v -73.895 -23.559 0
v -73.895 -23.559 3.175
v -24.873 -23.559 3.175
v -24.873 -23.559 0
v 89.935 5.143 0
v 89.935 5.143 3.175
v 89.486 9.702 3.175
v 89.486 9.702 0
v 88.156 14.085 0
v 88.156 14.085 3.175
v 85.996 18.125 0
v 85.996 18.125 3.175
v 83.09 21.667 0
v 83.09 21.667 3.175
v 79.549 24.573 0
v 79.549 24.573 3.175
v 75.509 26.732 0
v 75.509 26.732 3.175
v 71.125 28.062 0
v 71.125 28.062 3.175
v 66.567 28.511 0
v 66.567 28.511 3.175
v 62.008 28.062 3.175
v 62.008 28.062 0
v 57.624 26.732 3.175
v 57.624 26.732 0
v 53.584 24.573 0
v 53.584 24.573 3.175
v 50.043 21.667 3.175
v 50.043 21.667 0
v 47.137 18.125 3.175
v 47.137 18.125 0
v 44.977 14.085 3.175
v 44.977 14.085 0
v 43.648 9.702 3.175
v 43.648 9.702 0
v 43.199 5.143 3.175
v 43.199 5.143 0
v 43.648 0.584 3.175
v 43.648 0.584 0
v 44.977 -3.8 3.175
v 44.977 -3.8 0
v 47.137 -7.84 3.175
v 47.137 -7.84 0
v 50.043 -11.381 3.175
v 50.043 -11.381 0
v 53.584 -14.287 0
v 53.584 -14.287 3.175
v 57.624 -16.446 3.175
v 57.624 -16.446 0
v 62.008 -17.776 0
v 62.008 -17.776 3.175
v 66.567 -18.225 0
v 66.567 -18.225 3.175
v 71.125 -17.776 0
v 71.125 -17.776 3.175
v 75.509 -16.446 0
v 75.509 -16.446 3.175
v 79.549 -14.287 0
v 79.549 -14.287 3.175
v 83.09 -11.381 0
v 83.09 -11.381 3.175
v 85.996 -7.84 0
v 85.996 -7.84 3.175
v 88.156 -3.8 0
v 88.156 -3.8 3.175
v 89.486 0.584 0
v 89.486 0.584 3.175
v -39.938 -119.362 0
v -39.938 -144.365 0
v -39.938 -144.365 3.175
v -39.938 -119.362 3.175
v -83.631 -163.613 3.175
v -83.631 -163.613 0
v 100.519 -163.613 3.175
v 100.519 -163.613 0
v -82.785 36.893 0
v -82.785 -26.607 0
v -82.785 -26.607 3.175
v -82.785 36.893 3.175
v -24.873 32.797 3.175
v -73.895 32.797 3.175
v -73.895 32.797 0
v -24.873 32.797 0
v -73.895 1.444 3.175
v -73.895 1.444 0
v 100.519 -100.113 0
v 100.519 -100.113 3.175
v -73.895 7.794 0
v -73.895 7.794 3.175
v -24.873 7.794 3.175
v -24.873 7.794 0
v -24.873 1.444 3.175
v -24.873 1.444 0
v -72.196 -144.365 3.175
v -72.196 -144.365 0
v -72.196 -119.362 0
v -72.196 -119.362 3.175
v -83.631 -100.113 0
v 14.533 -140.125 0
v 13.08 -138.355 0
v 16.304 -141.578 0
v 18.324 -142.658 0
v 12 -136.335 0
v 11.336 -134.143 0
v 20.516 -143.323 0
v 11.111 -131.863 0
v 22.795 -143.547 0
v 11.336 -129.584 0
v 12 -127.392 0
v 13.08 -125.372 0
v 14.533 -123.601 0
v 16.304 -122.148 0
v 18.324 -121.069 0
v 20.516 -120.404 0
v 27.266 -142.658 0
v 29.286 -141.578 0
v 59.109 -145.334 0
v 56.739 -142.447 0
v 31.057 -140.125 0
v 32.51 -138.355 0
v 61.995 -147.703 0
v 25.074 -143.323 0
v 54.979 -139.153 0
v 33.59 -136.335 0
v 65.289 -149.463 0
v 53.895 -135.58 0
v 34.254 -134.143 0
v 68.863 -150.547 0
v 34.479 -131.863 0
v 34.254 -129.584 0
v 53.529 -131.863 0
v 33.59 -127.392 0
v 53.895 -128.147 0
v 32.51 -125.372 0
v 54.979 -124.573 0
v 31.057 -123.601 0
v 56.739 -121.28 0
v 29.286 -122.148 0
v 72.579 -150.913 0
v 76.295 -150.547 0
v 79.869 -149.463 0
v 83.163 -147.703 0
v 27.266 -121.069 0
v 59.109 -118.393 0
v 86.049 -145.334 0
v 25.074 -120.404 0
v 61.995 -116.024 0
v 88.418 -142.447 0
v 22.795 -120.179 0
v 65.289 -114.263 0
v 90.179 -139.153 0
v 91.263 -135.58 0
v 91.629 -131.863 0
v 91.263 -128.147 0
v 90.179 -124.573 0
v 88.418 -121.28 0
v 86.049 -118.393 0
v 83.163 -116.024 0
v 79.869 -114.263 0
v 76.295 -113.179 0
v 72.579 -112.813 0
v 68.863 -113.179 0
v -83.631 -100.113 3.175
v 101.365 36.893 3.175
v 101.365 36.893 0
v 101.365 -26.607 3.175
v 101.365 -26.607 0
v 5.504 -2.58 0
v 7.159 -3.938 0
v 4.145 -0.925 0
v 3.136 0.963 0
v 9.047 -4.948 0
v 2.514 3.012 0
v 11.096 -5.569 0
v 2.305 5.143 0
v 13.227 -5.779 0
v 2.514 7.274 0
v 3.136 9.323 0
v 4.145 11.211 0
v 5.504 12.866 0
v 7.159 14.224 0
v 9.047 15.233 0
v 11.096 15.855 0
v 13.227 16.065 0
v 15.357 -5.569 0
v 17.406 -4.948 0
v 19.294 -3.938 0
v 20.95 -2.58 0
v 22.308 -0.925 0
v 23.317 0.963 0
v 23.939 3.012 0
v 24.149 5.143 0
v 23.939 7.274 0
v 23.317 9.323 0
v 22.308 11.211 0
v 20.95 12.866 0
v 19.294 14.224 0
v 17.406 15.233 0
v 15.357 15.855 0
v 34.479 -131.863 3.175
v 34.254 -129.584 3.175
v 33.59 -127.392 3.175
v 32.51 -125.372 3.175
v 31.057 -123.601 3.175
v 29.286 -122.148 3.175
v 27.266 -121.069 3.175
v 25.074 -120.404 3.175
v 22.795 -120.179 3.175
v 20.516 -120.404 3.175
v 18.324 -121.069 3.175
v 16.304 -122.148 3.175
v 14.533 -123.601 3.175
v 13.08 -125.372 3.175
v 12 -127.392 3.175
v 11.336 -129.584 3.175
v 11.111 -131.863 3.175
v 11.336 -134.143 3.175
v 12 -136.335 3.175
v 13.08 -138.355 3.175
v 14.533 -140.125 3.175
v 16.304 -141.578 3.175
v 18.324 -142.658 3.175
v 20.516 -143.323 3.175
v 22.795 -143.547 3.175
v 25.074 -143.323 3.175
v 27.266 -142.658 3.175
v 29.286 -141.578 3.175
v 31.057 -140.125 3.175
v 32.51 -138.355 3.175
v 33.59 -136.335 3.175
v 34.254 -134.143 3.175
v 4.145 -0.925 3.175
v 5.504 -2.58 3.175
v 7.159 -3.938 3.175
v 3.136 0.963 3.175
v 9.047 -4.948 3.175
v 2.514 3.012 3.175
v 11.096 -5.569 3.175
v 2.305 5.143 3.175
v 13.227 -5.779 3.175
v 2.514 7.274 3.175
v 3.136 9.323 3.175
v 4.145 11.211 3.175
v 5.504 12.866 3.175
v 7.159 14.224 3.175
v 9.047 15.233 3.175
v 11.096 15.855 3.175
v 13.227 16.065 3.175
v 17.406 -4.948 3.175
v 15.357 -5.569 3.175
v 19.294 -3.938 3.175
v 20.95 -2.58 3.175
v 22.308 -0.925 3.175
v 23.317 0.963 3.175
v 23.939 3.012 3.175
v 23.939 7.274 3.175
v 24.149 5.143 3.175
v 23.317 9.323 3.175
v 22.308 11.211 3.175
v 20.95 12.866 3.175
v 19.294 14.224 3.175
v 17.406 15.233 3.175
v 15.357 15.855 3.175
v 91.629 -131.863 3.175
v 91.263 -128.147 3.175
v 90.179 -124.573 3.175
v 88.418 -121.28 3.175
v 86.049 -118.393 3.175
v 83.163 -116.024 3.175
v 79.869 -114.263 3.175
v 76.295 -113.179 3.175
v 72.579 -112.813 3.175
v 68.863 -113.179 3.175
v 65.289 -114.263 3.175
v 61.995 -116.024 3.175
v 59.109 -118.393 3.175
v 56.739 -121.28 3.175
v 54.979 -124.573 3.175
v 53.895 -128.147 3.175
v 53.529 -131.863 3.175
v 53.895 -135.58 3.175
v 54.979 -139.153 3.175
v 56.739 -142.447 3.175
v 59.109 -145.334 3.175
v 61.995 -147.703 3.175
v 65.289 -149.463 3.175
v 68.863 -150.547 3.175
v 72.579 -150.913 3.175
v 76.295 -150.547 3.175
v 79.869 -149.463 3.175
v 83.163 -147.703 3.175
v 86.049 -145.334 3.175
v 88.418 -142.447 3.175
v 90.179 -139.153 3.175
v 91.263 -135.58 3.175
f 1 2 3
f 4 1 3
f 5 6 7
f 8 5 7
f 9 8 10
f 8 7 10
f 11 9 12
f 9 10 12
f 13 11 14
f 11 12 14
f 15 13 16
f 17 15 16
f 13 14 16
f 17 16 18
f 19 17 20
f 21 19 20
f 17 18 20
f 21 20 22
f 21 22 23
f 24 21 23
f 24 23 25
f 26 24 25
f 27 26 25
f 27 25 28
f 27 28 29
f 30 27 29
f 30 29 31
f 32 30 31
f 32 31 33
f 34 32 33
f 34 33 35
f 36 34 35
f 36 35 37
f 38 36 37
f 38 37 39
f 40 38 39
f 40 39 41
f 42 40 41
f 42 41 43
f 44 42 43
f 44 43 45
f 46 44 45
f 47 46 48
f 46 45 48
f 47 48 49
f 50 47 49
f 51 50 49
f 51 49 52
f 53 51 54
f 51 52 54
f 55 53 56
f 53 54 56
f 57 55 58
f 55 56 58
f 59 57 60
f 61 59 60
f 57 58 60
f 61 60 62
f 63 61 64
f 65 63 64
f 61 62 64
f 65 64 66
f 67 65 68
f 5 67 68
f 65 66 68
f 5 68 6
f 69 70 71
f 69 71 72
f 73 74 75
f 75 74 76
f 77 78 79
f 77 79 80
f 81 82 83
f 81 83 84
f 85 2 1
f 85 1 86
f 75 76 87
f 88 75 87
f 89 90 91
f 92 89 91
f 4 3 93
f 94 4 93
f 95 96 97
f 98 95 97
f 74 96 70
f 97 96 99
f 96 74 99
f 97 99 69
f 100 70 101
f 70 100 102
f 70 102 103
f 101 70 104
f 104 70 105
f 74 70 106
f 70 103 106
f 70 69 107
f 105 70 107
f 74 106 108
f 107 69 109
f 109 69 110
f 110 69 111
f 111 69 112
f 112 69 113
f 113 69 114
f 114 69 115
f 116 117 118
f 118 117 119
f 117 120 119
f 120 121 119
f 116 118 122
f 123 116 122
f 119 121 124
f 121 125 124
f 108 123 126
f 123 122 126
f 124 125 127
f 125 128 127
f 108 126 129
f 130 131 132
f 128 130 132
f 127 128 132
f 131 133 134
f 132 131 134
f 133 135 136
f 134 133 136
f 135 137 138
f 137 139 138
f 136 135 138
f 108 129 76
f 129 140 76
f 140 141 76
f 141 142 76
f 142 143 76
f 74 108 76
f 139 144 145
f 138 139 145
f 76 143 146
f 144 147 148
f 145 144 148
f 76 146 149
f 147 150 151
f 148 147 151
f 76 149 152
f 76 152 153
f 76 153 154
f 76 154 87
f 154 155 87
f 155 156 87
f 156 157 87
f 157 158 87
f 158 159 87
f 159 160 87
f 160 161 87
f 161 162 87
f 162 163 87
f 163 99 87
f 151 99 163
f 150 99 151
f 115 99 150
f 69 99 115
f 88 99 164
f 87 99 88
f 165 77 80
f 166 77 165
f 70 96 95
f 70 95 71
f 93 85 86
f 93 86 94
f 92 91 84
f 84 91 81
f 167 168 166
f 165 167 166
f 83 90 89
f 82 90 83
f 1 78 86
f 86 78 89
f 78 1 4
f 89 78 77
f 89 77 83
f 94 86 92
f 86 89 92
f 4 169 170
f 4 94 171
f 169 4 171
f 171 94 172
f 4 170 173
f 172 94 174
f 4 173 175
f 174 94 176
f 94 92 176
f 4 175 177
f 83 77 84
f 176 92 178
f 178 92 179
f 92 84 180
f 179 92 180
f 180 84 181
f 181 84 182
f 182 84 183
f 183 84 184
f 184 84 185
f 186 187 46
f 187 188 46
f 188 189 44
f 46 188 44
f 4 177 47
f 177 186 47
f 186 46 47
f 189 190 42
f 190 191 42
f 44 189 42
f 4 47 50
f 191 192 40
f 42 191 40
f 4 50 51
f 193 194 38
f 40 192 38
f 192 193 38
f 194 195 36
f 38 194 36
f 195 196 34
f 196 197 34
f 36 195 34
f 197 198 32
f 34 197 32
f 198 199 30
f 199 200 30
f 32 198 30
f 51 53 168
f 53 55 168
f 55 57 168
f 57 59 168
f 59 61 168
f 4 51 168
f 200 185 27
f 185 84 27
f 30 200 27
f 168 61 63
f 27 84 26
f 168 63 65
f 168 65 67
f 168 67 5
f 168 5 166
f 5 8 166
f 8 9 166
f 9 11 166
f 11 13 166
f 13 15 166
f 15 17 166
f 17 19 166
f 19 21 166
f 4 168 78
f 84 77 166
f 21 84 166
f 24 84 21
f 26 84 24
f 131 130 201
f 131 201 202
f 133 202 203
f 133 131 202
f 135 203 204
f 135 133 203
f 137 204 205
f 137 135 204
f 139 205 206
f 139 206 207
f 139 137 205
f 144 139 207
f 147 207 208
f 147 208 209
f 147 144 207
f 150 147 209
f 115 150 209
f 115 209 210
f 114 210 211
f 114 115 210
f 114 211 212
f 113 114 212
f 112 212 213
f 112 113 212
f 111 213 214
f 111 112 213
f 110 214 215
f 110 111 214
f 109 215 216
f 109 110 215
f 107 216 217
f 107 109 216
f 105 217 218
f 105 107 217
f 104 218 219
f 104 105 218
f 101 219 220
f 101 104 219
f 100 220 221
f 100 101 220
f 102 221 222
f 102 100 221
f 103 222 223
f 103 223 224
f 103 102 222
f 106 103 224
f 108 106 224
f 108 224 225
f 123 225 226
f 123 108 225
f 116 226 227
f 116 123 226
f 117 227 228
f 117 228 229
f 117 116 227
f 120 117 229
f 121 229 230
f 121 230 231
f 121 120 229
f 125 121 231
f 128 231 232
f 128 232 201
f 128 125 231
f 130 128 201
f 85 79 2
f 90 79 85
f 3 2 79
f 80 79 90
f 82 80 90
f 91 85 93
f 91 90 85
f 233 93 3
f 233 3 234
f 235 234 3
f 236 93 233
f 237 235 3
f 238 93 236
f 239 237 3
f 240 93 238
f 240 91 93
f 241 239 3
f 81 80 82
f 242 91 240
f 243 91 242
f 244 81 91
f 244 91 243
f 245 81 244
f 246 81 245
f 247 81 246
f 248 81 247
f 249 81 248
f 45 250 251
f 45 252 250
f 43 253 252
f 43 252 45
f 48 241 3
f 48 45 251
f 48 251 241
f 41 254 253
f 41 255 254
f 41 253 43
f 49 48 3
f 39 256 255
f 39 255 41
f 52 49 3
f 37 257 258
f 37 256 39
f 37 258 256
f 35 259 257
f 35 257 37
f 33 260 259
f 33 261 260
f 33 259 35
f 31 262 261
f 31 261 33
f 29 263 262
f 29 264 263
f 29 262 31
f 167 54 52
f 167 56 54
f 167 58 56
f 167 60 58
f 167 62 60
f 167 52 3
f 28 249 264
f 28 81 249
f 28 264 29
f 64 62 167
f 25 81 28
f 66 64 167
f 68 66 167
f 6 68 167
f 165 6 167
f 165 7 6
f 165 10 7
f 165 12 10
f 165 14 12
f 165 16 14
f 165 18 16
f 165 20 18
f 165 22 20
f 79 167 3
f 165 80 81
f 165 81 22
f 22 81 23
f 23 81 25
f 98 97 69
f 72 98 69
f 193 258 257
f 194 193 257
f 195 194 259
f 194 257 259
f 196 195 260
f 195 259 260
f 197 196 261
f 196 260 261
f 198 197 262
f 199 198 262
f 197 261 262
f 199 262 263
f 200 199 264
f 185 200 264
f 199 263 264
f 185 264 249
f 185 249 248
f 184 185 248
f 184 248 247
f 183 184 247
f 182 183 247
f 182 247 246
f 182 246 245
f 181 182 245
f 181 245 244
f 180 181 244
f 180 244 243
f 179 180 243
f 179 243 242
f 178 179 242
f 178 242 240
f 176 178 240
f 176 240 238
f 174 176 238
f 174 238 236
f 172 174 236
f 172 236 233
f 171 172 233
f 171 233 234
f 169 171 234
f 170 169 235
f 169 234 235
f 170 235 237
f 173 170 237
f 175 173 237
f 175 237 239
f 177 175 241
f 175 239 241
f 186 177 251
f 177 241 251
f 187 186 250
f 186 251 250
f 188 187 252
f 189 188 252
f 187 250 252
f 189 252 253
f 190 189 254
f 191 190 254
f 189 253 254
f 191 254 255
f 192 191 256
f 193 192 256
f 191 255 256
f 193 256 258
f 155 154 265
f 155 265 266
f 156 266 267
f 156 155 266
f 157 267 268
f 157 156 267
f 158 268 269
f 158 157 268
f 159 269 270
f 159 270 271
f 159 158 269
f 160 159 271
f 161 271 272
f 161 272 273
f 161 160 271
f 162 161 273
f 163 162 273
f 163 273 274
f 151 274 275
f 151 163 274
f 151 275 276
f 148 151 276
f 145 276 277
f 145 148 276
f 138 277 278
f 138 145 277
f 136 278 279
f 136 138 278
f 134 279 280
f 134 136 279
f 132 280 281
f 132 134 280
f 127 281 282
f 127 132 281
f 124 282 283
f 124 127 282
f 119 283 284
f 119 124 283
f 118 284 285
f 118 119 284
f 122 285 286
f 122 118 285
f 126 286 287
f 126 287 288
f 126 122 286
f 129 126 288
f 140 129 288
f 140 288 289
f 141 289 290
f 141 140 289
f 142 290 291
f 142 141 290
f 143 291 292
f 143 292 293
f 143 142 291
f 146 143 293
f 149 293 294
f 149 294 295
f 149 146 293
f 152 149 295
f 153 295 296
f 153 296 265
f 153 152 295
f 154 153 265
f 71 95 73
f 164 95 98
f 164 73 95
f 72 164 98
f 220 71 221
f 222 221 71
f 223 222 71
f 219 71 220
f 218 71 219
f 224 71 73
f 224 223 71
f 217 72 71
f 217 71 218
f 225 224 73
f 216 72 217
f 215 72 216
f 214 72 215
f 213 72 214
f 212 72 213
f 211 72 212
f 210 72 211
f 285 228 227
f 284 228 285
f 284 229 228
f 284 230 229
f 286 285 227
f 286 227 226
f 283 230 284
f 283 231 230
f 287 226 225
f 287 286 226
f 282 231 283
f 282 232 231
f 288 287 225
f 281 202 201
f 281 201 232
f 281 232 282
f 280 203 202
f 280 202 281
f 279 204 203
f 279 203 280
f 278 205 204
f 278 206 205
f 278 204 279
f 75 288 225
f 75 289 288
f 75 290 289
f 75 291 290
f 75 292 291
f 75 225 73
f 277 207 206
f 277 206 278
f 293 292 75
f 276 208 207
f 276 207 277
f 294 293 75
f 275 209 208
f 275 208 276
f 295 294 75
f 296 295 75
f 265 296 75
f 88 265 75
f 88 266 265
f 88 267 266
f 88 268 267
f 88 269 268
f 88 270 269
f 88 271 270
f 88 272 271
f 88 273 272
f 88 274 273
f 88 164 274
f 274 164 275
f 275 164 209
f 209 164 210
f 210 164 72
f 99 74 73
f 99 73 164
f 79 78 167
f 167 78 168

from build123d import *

# Parameters (mm, degrees)
F0_W     = 184.15
F0_H     = 63.5
F1_DEPTH = 3.175
F2_W     = 49.022
F2_H     = 25.003125
F2_R     = 23.368
F2_R_2   = 10.922
F3_DEPTH = 25.4
F4_W     = 184.15
F4_H     = 63.5
F5_DEPTH = 3.175
F6_R     = 19.05
F6_R_2   = 11.684
F6_W     = 32.258
F6_H     = 25.003125
F7_DEPTH = 3.175


with BuildPart() as f1:
    # F0 (on Top) → F1 (new body)
    with BuildSketch(Plane.XY):
        with Locations((9.289552, 5.142859)):
            Rectangle(F0_W, F0_H)
    extrude(amount=F1_DEPTH)

    # F2 (on face) → F3 (cut)
    with BuildSketch(Plane.XY.offset(3.175)):
        with Locations((-49.384448, 20.295544)):
            Rectangle(F2_W, F2_H)
        with Locations((-49.384448, -11.057581)):
            Rectangle(F2_W, F2_H)
        with Locations((66.566552, 5.142859)):
            Circle(F2_R)
        with Locations((13.226552, 5.142859)):
            Circle(F2_R_2)
    extrude(amount=-F3_DEPTH, mode=Mode.SUBTRACT)


with BuildPart() as f5:
    # F4 (on Top) → F5 (new body)
    with BuildSketch(Plane.XY):
        with Locations((8.443996, -131.863282)):
            Rectangle(F4_W, F4_H)
    extrude(amount=F5_DEPTH)

    # F6 (on face) → F7 (cut, through all)
    with BuildSketch(Plane.XY):
        with Locations((72.578996, -131.863282)):
            Circle(F6_R)
        with Locations((22.794996, -131.863282)):
            Circle(F6_R_2)
        with Locations((-56.066984, -131.863282)):
            Rectangle(F6_W, F6_H)
    extrude(amount=F7_DEPTH, mode=Mode.SUBTRACT)


solid = Compound([f1.part, f5.part])
